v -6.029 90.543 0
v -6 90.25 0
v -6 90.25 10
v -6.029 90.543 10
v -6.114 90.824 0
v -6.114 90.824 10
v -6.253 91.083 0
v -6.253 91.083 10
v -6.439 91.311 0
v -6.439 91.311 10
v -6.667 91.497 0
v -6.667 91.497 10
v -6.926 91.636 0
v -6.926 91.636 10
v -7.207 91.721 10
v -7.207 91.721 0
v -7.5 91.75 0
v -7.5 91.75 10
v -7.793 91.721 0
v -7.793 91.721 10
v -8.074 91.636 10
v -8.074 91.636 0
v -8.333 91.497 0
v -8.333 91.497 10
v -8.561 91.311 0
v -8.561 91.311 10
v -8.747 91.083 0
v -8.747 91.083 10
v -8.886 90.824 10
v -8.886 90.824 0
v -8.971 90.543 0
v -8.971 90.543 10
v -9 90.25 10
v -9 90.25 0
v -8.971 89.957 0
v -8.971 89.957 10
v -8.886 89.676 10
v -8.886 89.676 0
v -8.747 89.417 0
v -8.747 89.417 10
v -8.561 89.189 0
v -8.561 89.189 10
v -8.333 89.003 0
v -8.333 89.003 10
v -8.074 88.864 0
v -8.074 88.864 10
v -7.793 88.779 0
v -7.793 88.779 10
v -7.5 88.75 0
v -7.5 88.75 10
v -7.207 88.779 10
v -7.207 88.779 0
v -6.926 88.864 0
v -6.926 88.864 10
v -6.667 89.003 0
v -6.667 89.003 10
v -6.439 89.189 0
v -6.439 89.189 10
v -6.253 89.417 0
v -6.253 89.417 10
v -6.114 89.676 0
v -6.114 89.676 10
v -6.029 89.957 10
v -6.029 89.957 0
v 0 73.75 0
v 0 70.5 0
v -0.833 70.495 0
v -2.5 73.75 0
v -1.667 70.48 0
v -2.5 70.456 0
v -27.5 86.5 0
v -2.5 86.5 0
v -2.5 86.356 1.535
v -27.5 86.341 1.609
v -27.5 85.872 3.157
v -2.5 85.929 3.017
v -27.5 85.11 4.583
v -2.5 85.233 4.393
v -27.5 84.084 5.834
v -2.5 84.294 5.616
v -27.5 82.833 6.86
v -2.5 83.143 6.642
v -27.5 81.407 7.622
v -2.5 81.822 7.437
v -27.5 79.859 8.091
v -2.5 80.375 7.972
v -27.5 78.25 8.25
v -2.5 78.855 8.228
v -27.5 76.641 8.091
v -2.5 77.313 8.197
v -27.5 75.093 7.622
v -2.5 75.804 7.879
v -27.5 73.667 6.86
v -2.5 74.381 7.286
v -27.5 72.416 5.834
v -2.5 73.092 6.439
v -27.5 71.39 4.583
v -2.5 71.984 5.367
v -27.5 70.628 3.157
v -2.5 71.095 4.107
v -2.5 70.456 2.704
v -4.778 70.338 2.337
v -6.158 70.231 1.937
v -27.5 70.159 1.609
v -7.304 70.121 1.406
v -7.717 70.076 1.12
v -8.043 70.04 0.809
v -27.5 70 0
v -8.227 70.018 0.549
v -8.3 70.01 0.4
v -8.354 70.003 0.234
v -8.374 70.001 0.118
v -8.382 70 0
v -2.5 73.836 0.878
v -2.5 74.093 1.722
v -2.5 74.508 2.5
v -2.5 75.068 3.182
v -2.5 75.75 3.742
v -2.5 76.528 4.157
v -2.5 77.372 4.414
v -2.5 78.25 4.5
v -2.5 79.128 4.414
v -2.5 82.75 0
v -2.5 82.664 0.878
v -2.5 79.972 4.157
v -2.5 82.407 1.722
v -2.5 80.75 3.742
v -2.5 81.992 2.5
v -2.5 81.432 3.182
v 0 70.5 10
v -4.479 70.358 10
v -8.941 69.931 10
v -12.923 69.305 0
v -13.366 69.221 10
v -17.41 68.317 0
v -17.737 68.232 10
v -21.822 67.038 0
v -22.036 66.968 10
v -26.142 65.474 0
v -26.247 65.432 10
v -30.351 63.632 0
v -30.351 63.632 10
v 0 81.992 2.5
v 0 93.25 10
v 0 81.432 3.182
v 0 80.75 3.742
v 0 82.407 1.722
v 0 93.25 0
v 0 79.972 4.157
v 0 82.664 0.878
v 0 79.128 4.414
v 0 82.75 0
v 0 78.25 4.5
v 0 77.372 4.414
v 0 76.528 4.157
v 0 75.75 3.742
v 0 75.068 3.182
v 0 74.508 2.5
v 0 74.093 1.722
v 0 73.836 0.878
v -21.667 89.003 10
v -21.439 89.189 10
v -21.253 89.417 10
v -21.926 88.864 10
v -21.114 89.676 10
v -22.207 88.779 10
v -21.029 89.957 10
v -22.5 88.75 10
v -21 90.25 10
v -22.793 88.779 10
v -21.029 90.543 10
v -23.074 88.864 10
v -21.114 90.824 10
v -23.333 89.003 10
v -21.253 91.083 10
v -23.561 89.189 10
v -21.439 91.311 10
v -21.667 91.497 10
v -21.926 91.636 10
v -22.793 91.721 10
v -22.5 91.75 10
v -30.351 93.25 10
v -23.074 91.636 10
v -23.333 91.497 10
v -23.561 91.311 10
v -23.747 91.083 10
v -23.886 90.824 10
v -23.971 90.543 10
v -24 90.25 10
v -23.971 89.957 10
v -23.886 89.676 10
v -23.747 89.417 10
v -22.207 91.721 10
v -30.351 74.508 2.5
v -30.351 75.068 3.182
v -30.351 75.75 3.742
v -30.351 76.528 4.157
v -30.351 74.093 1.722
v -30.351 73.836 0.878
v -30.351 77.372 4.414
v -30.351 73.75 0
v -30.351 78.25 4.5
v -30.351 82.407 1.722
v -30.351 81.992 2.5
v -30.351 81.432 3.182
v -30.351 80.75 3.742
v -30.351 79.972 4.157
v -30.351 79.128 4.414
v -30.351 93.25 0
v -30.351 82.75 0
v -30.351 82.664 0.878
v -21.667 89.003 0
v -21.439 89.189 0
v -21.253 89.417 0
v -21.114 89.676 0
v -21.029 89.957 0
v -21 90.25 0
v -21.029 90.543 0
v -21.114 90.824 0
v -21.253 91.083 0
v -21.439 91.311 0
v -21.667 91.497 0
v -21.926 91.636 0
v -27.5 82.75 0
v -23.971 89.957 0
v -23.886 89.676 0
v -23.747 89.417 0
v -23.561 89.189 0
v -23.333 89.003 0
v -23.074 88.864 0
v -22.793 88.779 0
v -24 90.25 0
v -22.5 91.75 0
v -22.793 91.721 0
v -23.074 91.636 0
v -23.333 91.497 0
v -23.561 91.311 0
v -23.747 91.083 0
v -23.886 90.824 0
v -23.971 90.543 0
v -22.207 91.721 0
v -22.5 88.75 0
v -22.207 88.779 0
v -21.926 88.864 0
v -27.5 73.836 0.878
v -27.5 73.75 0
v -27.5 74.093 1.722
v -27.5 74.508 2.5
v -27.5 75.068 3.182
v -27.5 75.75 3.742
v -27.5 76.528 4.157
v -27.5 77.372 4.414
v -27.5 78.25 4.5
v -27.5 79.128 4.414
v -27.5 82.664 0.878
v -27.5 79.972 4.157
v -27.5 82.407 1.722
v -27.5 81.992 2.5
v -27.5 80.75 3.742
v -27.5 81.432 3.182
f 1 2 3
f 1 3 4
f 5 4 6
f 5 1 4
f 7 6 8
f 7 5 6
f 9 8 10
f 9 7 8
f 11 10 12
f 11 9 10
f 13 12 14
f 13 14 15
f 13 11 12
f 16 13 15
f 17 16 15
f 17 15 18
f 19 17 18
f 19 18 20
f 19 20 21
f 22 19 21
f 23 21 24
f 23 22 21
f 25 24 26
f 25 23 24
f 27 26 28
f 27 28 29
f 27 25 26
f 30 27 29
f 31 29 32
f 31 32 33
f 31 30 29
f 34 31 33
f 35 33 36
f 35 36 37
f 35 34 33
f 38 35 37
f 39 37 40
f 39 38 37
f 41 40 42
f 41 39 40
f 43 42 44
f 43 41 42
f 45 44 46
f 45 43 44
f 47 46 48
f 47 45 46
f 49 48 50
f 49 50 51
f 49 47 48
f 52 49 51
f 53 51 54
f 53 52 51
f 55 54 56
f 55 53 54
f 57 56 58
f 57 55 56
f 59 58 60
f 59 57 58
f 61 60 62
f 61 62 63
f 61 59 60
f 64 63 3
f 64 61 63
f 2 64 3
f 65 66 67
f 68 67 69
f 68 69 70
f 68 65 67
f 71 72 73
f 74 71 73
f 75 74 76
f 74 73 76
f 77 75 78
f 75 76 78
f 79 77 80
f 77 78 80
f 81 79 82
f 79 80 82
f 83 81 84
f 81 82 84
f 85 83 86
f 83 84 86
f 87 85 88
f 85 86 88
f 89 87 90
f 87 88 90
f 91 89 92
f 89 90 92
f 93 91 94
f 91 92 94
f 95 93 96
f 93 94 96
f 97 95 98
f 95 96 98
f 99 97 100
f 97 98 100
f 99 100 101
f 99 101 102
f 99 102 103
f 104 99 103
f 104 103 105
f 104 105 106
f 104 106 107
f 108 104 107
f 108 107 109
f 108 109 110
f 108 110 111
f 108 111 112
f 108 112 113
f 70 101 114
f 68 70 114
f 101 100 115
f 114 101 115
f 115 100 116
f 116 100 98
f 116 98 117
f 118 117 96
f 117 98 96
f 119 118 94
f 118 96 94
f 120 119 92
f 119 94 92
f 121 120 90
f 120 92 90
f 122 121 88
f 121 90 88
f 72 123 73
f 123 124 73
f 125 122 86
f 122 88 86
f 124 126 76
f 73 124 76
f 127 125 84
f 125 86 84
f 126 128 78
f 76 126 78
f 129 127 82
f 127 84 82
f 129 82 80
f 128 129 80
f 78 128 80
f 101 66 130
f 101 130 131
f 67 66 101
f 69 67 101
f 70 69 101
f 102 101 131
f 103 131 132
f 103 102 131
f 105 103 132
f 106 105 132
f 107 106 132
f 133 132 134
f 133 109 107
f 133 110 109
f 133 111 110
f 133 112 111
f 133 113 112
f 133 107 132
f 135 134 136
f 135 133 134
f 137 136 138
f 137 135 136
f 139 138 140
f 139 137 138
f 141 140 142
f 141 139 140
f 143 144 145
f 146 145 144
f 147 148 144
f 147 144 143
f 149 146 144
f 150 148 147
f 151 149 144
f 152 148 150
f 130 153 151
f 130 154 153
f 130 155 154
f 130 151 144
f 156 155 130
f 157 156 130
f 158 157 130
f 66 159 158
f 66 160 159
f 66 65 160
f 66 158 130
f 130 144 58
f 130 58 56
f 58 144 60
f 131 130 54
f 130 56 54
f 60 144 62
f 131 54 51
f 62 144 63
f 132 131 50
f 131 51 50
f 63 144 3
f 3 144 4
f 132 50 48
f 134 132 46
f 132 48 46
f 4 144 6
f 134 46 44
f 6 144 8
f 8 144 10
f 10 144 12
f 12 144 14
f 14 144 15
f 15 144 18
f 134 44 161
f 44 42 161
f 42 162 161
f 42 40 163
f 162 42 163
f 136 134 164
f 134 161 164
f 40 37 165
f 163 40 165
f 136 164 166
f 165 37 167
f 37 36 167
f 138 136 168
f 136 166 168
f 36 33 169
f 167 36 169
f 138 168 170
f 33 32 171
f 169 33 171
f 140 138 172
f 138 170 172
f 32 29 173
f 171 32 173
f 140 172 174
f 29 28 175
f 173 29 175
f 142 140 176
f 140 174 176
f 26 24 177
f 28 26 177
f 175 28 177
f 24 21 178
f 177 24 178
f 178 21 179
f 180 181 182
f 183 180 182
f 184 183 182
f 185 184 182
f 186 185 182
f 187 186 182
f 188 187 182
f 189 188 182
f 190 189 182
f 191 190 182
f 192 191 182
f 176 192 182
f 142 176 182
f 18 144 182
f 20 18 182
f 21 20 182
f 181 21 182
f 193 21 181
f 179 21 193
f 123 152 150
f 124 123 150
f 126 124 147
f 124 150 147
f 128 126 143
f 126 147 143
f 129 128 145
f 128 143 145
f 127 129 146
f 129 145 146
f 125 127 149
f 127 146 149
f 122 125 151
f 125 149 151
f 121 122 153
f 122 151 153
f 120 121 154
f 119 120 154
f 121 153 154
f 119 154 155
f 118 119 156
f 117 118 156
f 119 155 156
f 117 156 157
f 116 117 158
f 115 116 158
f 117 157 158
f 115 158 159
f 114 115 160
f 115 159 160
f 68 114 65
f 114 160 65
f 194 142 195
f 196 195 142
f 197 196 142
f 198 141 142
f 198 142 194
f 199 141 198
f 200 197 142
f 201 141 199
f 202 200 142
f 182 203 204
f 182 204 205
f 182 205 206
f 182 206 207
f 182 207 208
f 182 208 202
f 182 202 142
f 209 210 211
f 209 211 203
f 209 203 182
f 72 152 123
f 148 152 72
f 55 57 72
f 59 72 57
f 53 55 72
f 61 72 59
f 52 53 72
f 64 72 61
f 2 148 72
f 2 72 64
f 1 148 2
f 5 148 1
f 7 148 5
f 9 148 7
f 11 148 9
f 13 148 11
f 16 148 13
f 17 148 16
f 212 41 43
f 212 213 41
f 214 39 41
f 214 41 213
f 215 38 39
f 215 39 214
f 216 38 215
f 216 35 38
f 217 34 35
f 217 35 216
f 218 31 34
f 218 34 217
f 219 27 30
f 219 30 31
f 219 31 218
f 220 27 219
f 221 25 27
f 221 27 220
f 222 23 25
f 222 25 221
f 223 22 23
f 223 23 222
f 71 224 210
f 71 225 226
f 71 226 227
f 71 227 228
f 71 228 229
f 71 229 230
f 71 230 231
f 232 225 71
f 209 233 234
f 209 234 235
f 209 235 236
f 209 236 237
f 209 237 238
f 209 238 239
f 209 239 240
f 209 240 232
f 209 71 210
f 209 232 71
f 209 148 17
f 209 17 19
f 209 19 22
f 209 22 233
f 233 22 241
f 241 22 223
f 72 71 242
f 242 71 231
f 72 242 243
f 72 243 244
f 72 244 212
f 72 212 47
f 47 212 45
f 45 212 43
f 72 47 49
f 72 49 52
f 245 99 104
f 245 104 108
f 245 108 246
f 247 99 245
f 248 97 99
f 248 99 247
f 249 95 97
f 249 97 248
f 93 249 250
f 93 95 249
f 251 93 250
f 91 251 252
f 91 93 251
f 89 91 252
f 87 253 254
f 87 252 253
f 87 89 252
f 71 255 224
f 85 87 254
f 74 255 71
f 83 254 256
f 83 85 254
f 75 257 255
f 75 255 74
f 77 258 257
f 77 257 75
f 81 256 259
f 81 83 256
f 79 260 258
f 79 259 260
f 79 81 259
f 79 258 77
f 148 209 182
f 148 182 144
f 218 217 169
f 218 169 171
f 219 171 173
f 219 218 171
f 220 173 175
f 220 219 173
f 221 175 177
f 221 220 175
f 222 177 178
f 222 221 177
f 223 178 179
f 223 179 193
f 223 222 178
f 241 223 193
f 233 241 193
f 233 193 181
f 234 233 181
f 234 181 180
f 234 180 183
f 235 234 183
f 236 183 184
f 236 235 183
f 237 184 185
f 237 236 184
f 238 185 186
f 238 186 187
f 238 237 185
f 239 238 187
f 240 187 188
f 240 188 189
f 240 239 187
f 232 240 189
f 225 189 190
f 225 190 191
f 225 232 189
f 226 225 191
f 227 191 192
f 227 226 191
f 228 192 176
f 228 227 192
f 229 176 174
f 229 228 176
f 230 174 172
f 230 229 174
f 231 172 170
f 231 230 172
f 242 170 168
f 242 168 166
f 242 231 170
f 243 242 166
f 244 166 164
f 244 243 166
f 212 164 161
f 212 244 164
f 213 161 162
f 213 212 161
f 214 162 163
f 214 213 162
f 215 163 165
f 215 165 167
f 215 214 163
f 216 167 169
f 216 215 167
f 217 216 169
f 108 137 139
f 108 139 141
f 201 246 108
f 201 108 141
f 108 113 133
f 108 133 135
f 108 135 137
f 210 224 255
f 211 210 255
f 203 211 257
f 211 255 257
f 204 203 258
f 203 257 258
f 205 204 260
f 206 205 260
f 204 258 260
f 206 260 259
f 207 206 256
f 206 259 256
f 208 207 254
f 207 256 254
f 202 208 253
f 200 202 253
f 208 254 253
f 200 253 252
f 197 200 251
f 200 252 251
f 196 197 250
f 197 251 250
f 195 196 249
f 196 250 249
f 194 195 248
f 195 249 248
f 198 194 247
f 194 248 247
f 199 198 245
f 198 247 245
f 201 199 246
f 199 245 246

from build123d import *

# Parameters (mm, degrees)
SKETCH_R        = 1.5
PAD_DEPTH       = 10
SKETCH001_R     = 4.5
POCKET_DEPTH    = 30.352032
SKETCH002_R     = 8.25
POCKET001_DEPTH = 25


with BuildPart() as part:
    # Sketch → Pad (new body)
    with BuildSketch(Plane.XY):
        with BuildLine():
            ThreePointArc((0, 70.5), (-15.559169, 68.761634), (-30.351032, 63.632263))
            Line((-30.351032, 63.632263), (-30.351032, 93.25))
            Line((-30.351032, 93.25), (0, 93.25))
            Line((0, 93.25), (0, 70.5))
        make_face()
        with Locations((-7.5, 90.25)):
            Circle(SKETCH_R, mode=Mode.SUBTRACT)
        with Locations((-22.5, 90.25)):
            Circle(SKETCH_R, mode=Mode.SUBTRACT)
    extrude(amount=PAD_DEPTH)

    # Sketch001 (on Face4 of Pad) → Pocket (cut, through all)
    with BuildSketch(Plane.YZ):
        with Locations((78.25, 0)):
            Circle(SKETCH001_R)
    extrude(amount=-POCKET_DEPTH, mode=Mode.SUBTRACT)

    # Sketch002 (on Face2 of Pocket) → Pocket001 (cut)
    with BuildSketch(Plane.YZ.offset(-2.5)):
        with Locations((78.25, 0)):
            Circle(SKETCH002_R)
    extrude(amount=-POCKET001_DEPTH, mode=Mode.SUBTRACT)


solid = part.part
